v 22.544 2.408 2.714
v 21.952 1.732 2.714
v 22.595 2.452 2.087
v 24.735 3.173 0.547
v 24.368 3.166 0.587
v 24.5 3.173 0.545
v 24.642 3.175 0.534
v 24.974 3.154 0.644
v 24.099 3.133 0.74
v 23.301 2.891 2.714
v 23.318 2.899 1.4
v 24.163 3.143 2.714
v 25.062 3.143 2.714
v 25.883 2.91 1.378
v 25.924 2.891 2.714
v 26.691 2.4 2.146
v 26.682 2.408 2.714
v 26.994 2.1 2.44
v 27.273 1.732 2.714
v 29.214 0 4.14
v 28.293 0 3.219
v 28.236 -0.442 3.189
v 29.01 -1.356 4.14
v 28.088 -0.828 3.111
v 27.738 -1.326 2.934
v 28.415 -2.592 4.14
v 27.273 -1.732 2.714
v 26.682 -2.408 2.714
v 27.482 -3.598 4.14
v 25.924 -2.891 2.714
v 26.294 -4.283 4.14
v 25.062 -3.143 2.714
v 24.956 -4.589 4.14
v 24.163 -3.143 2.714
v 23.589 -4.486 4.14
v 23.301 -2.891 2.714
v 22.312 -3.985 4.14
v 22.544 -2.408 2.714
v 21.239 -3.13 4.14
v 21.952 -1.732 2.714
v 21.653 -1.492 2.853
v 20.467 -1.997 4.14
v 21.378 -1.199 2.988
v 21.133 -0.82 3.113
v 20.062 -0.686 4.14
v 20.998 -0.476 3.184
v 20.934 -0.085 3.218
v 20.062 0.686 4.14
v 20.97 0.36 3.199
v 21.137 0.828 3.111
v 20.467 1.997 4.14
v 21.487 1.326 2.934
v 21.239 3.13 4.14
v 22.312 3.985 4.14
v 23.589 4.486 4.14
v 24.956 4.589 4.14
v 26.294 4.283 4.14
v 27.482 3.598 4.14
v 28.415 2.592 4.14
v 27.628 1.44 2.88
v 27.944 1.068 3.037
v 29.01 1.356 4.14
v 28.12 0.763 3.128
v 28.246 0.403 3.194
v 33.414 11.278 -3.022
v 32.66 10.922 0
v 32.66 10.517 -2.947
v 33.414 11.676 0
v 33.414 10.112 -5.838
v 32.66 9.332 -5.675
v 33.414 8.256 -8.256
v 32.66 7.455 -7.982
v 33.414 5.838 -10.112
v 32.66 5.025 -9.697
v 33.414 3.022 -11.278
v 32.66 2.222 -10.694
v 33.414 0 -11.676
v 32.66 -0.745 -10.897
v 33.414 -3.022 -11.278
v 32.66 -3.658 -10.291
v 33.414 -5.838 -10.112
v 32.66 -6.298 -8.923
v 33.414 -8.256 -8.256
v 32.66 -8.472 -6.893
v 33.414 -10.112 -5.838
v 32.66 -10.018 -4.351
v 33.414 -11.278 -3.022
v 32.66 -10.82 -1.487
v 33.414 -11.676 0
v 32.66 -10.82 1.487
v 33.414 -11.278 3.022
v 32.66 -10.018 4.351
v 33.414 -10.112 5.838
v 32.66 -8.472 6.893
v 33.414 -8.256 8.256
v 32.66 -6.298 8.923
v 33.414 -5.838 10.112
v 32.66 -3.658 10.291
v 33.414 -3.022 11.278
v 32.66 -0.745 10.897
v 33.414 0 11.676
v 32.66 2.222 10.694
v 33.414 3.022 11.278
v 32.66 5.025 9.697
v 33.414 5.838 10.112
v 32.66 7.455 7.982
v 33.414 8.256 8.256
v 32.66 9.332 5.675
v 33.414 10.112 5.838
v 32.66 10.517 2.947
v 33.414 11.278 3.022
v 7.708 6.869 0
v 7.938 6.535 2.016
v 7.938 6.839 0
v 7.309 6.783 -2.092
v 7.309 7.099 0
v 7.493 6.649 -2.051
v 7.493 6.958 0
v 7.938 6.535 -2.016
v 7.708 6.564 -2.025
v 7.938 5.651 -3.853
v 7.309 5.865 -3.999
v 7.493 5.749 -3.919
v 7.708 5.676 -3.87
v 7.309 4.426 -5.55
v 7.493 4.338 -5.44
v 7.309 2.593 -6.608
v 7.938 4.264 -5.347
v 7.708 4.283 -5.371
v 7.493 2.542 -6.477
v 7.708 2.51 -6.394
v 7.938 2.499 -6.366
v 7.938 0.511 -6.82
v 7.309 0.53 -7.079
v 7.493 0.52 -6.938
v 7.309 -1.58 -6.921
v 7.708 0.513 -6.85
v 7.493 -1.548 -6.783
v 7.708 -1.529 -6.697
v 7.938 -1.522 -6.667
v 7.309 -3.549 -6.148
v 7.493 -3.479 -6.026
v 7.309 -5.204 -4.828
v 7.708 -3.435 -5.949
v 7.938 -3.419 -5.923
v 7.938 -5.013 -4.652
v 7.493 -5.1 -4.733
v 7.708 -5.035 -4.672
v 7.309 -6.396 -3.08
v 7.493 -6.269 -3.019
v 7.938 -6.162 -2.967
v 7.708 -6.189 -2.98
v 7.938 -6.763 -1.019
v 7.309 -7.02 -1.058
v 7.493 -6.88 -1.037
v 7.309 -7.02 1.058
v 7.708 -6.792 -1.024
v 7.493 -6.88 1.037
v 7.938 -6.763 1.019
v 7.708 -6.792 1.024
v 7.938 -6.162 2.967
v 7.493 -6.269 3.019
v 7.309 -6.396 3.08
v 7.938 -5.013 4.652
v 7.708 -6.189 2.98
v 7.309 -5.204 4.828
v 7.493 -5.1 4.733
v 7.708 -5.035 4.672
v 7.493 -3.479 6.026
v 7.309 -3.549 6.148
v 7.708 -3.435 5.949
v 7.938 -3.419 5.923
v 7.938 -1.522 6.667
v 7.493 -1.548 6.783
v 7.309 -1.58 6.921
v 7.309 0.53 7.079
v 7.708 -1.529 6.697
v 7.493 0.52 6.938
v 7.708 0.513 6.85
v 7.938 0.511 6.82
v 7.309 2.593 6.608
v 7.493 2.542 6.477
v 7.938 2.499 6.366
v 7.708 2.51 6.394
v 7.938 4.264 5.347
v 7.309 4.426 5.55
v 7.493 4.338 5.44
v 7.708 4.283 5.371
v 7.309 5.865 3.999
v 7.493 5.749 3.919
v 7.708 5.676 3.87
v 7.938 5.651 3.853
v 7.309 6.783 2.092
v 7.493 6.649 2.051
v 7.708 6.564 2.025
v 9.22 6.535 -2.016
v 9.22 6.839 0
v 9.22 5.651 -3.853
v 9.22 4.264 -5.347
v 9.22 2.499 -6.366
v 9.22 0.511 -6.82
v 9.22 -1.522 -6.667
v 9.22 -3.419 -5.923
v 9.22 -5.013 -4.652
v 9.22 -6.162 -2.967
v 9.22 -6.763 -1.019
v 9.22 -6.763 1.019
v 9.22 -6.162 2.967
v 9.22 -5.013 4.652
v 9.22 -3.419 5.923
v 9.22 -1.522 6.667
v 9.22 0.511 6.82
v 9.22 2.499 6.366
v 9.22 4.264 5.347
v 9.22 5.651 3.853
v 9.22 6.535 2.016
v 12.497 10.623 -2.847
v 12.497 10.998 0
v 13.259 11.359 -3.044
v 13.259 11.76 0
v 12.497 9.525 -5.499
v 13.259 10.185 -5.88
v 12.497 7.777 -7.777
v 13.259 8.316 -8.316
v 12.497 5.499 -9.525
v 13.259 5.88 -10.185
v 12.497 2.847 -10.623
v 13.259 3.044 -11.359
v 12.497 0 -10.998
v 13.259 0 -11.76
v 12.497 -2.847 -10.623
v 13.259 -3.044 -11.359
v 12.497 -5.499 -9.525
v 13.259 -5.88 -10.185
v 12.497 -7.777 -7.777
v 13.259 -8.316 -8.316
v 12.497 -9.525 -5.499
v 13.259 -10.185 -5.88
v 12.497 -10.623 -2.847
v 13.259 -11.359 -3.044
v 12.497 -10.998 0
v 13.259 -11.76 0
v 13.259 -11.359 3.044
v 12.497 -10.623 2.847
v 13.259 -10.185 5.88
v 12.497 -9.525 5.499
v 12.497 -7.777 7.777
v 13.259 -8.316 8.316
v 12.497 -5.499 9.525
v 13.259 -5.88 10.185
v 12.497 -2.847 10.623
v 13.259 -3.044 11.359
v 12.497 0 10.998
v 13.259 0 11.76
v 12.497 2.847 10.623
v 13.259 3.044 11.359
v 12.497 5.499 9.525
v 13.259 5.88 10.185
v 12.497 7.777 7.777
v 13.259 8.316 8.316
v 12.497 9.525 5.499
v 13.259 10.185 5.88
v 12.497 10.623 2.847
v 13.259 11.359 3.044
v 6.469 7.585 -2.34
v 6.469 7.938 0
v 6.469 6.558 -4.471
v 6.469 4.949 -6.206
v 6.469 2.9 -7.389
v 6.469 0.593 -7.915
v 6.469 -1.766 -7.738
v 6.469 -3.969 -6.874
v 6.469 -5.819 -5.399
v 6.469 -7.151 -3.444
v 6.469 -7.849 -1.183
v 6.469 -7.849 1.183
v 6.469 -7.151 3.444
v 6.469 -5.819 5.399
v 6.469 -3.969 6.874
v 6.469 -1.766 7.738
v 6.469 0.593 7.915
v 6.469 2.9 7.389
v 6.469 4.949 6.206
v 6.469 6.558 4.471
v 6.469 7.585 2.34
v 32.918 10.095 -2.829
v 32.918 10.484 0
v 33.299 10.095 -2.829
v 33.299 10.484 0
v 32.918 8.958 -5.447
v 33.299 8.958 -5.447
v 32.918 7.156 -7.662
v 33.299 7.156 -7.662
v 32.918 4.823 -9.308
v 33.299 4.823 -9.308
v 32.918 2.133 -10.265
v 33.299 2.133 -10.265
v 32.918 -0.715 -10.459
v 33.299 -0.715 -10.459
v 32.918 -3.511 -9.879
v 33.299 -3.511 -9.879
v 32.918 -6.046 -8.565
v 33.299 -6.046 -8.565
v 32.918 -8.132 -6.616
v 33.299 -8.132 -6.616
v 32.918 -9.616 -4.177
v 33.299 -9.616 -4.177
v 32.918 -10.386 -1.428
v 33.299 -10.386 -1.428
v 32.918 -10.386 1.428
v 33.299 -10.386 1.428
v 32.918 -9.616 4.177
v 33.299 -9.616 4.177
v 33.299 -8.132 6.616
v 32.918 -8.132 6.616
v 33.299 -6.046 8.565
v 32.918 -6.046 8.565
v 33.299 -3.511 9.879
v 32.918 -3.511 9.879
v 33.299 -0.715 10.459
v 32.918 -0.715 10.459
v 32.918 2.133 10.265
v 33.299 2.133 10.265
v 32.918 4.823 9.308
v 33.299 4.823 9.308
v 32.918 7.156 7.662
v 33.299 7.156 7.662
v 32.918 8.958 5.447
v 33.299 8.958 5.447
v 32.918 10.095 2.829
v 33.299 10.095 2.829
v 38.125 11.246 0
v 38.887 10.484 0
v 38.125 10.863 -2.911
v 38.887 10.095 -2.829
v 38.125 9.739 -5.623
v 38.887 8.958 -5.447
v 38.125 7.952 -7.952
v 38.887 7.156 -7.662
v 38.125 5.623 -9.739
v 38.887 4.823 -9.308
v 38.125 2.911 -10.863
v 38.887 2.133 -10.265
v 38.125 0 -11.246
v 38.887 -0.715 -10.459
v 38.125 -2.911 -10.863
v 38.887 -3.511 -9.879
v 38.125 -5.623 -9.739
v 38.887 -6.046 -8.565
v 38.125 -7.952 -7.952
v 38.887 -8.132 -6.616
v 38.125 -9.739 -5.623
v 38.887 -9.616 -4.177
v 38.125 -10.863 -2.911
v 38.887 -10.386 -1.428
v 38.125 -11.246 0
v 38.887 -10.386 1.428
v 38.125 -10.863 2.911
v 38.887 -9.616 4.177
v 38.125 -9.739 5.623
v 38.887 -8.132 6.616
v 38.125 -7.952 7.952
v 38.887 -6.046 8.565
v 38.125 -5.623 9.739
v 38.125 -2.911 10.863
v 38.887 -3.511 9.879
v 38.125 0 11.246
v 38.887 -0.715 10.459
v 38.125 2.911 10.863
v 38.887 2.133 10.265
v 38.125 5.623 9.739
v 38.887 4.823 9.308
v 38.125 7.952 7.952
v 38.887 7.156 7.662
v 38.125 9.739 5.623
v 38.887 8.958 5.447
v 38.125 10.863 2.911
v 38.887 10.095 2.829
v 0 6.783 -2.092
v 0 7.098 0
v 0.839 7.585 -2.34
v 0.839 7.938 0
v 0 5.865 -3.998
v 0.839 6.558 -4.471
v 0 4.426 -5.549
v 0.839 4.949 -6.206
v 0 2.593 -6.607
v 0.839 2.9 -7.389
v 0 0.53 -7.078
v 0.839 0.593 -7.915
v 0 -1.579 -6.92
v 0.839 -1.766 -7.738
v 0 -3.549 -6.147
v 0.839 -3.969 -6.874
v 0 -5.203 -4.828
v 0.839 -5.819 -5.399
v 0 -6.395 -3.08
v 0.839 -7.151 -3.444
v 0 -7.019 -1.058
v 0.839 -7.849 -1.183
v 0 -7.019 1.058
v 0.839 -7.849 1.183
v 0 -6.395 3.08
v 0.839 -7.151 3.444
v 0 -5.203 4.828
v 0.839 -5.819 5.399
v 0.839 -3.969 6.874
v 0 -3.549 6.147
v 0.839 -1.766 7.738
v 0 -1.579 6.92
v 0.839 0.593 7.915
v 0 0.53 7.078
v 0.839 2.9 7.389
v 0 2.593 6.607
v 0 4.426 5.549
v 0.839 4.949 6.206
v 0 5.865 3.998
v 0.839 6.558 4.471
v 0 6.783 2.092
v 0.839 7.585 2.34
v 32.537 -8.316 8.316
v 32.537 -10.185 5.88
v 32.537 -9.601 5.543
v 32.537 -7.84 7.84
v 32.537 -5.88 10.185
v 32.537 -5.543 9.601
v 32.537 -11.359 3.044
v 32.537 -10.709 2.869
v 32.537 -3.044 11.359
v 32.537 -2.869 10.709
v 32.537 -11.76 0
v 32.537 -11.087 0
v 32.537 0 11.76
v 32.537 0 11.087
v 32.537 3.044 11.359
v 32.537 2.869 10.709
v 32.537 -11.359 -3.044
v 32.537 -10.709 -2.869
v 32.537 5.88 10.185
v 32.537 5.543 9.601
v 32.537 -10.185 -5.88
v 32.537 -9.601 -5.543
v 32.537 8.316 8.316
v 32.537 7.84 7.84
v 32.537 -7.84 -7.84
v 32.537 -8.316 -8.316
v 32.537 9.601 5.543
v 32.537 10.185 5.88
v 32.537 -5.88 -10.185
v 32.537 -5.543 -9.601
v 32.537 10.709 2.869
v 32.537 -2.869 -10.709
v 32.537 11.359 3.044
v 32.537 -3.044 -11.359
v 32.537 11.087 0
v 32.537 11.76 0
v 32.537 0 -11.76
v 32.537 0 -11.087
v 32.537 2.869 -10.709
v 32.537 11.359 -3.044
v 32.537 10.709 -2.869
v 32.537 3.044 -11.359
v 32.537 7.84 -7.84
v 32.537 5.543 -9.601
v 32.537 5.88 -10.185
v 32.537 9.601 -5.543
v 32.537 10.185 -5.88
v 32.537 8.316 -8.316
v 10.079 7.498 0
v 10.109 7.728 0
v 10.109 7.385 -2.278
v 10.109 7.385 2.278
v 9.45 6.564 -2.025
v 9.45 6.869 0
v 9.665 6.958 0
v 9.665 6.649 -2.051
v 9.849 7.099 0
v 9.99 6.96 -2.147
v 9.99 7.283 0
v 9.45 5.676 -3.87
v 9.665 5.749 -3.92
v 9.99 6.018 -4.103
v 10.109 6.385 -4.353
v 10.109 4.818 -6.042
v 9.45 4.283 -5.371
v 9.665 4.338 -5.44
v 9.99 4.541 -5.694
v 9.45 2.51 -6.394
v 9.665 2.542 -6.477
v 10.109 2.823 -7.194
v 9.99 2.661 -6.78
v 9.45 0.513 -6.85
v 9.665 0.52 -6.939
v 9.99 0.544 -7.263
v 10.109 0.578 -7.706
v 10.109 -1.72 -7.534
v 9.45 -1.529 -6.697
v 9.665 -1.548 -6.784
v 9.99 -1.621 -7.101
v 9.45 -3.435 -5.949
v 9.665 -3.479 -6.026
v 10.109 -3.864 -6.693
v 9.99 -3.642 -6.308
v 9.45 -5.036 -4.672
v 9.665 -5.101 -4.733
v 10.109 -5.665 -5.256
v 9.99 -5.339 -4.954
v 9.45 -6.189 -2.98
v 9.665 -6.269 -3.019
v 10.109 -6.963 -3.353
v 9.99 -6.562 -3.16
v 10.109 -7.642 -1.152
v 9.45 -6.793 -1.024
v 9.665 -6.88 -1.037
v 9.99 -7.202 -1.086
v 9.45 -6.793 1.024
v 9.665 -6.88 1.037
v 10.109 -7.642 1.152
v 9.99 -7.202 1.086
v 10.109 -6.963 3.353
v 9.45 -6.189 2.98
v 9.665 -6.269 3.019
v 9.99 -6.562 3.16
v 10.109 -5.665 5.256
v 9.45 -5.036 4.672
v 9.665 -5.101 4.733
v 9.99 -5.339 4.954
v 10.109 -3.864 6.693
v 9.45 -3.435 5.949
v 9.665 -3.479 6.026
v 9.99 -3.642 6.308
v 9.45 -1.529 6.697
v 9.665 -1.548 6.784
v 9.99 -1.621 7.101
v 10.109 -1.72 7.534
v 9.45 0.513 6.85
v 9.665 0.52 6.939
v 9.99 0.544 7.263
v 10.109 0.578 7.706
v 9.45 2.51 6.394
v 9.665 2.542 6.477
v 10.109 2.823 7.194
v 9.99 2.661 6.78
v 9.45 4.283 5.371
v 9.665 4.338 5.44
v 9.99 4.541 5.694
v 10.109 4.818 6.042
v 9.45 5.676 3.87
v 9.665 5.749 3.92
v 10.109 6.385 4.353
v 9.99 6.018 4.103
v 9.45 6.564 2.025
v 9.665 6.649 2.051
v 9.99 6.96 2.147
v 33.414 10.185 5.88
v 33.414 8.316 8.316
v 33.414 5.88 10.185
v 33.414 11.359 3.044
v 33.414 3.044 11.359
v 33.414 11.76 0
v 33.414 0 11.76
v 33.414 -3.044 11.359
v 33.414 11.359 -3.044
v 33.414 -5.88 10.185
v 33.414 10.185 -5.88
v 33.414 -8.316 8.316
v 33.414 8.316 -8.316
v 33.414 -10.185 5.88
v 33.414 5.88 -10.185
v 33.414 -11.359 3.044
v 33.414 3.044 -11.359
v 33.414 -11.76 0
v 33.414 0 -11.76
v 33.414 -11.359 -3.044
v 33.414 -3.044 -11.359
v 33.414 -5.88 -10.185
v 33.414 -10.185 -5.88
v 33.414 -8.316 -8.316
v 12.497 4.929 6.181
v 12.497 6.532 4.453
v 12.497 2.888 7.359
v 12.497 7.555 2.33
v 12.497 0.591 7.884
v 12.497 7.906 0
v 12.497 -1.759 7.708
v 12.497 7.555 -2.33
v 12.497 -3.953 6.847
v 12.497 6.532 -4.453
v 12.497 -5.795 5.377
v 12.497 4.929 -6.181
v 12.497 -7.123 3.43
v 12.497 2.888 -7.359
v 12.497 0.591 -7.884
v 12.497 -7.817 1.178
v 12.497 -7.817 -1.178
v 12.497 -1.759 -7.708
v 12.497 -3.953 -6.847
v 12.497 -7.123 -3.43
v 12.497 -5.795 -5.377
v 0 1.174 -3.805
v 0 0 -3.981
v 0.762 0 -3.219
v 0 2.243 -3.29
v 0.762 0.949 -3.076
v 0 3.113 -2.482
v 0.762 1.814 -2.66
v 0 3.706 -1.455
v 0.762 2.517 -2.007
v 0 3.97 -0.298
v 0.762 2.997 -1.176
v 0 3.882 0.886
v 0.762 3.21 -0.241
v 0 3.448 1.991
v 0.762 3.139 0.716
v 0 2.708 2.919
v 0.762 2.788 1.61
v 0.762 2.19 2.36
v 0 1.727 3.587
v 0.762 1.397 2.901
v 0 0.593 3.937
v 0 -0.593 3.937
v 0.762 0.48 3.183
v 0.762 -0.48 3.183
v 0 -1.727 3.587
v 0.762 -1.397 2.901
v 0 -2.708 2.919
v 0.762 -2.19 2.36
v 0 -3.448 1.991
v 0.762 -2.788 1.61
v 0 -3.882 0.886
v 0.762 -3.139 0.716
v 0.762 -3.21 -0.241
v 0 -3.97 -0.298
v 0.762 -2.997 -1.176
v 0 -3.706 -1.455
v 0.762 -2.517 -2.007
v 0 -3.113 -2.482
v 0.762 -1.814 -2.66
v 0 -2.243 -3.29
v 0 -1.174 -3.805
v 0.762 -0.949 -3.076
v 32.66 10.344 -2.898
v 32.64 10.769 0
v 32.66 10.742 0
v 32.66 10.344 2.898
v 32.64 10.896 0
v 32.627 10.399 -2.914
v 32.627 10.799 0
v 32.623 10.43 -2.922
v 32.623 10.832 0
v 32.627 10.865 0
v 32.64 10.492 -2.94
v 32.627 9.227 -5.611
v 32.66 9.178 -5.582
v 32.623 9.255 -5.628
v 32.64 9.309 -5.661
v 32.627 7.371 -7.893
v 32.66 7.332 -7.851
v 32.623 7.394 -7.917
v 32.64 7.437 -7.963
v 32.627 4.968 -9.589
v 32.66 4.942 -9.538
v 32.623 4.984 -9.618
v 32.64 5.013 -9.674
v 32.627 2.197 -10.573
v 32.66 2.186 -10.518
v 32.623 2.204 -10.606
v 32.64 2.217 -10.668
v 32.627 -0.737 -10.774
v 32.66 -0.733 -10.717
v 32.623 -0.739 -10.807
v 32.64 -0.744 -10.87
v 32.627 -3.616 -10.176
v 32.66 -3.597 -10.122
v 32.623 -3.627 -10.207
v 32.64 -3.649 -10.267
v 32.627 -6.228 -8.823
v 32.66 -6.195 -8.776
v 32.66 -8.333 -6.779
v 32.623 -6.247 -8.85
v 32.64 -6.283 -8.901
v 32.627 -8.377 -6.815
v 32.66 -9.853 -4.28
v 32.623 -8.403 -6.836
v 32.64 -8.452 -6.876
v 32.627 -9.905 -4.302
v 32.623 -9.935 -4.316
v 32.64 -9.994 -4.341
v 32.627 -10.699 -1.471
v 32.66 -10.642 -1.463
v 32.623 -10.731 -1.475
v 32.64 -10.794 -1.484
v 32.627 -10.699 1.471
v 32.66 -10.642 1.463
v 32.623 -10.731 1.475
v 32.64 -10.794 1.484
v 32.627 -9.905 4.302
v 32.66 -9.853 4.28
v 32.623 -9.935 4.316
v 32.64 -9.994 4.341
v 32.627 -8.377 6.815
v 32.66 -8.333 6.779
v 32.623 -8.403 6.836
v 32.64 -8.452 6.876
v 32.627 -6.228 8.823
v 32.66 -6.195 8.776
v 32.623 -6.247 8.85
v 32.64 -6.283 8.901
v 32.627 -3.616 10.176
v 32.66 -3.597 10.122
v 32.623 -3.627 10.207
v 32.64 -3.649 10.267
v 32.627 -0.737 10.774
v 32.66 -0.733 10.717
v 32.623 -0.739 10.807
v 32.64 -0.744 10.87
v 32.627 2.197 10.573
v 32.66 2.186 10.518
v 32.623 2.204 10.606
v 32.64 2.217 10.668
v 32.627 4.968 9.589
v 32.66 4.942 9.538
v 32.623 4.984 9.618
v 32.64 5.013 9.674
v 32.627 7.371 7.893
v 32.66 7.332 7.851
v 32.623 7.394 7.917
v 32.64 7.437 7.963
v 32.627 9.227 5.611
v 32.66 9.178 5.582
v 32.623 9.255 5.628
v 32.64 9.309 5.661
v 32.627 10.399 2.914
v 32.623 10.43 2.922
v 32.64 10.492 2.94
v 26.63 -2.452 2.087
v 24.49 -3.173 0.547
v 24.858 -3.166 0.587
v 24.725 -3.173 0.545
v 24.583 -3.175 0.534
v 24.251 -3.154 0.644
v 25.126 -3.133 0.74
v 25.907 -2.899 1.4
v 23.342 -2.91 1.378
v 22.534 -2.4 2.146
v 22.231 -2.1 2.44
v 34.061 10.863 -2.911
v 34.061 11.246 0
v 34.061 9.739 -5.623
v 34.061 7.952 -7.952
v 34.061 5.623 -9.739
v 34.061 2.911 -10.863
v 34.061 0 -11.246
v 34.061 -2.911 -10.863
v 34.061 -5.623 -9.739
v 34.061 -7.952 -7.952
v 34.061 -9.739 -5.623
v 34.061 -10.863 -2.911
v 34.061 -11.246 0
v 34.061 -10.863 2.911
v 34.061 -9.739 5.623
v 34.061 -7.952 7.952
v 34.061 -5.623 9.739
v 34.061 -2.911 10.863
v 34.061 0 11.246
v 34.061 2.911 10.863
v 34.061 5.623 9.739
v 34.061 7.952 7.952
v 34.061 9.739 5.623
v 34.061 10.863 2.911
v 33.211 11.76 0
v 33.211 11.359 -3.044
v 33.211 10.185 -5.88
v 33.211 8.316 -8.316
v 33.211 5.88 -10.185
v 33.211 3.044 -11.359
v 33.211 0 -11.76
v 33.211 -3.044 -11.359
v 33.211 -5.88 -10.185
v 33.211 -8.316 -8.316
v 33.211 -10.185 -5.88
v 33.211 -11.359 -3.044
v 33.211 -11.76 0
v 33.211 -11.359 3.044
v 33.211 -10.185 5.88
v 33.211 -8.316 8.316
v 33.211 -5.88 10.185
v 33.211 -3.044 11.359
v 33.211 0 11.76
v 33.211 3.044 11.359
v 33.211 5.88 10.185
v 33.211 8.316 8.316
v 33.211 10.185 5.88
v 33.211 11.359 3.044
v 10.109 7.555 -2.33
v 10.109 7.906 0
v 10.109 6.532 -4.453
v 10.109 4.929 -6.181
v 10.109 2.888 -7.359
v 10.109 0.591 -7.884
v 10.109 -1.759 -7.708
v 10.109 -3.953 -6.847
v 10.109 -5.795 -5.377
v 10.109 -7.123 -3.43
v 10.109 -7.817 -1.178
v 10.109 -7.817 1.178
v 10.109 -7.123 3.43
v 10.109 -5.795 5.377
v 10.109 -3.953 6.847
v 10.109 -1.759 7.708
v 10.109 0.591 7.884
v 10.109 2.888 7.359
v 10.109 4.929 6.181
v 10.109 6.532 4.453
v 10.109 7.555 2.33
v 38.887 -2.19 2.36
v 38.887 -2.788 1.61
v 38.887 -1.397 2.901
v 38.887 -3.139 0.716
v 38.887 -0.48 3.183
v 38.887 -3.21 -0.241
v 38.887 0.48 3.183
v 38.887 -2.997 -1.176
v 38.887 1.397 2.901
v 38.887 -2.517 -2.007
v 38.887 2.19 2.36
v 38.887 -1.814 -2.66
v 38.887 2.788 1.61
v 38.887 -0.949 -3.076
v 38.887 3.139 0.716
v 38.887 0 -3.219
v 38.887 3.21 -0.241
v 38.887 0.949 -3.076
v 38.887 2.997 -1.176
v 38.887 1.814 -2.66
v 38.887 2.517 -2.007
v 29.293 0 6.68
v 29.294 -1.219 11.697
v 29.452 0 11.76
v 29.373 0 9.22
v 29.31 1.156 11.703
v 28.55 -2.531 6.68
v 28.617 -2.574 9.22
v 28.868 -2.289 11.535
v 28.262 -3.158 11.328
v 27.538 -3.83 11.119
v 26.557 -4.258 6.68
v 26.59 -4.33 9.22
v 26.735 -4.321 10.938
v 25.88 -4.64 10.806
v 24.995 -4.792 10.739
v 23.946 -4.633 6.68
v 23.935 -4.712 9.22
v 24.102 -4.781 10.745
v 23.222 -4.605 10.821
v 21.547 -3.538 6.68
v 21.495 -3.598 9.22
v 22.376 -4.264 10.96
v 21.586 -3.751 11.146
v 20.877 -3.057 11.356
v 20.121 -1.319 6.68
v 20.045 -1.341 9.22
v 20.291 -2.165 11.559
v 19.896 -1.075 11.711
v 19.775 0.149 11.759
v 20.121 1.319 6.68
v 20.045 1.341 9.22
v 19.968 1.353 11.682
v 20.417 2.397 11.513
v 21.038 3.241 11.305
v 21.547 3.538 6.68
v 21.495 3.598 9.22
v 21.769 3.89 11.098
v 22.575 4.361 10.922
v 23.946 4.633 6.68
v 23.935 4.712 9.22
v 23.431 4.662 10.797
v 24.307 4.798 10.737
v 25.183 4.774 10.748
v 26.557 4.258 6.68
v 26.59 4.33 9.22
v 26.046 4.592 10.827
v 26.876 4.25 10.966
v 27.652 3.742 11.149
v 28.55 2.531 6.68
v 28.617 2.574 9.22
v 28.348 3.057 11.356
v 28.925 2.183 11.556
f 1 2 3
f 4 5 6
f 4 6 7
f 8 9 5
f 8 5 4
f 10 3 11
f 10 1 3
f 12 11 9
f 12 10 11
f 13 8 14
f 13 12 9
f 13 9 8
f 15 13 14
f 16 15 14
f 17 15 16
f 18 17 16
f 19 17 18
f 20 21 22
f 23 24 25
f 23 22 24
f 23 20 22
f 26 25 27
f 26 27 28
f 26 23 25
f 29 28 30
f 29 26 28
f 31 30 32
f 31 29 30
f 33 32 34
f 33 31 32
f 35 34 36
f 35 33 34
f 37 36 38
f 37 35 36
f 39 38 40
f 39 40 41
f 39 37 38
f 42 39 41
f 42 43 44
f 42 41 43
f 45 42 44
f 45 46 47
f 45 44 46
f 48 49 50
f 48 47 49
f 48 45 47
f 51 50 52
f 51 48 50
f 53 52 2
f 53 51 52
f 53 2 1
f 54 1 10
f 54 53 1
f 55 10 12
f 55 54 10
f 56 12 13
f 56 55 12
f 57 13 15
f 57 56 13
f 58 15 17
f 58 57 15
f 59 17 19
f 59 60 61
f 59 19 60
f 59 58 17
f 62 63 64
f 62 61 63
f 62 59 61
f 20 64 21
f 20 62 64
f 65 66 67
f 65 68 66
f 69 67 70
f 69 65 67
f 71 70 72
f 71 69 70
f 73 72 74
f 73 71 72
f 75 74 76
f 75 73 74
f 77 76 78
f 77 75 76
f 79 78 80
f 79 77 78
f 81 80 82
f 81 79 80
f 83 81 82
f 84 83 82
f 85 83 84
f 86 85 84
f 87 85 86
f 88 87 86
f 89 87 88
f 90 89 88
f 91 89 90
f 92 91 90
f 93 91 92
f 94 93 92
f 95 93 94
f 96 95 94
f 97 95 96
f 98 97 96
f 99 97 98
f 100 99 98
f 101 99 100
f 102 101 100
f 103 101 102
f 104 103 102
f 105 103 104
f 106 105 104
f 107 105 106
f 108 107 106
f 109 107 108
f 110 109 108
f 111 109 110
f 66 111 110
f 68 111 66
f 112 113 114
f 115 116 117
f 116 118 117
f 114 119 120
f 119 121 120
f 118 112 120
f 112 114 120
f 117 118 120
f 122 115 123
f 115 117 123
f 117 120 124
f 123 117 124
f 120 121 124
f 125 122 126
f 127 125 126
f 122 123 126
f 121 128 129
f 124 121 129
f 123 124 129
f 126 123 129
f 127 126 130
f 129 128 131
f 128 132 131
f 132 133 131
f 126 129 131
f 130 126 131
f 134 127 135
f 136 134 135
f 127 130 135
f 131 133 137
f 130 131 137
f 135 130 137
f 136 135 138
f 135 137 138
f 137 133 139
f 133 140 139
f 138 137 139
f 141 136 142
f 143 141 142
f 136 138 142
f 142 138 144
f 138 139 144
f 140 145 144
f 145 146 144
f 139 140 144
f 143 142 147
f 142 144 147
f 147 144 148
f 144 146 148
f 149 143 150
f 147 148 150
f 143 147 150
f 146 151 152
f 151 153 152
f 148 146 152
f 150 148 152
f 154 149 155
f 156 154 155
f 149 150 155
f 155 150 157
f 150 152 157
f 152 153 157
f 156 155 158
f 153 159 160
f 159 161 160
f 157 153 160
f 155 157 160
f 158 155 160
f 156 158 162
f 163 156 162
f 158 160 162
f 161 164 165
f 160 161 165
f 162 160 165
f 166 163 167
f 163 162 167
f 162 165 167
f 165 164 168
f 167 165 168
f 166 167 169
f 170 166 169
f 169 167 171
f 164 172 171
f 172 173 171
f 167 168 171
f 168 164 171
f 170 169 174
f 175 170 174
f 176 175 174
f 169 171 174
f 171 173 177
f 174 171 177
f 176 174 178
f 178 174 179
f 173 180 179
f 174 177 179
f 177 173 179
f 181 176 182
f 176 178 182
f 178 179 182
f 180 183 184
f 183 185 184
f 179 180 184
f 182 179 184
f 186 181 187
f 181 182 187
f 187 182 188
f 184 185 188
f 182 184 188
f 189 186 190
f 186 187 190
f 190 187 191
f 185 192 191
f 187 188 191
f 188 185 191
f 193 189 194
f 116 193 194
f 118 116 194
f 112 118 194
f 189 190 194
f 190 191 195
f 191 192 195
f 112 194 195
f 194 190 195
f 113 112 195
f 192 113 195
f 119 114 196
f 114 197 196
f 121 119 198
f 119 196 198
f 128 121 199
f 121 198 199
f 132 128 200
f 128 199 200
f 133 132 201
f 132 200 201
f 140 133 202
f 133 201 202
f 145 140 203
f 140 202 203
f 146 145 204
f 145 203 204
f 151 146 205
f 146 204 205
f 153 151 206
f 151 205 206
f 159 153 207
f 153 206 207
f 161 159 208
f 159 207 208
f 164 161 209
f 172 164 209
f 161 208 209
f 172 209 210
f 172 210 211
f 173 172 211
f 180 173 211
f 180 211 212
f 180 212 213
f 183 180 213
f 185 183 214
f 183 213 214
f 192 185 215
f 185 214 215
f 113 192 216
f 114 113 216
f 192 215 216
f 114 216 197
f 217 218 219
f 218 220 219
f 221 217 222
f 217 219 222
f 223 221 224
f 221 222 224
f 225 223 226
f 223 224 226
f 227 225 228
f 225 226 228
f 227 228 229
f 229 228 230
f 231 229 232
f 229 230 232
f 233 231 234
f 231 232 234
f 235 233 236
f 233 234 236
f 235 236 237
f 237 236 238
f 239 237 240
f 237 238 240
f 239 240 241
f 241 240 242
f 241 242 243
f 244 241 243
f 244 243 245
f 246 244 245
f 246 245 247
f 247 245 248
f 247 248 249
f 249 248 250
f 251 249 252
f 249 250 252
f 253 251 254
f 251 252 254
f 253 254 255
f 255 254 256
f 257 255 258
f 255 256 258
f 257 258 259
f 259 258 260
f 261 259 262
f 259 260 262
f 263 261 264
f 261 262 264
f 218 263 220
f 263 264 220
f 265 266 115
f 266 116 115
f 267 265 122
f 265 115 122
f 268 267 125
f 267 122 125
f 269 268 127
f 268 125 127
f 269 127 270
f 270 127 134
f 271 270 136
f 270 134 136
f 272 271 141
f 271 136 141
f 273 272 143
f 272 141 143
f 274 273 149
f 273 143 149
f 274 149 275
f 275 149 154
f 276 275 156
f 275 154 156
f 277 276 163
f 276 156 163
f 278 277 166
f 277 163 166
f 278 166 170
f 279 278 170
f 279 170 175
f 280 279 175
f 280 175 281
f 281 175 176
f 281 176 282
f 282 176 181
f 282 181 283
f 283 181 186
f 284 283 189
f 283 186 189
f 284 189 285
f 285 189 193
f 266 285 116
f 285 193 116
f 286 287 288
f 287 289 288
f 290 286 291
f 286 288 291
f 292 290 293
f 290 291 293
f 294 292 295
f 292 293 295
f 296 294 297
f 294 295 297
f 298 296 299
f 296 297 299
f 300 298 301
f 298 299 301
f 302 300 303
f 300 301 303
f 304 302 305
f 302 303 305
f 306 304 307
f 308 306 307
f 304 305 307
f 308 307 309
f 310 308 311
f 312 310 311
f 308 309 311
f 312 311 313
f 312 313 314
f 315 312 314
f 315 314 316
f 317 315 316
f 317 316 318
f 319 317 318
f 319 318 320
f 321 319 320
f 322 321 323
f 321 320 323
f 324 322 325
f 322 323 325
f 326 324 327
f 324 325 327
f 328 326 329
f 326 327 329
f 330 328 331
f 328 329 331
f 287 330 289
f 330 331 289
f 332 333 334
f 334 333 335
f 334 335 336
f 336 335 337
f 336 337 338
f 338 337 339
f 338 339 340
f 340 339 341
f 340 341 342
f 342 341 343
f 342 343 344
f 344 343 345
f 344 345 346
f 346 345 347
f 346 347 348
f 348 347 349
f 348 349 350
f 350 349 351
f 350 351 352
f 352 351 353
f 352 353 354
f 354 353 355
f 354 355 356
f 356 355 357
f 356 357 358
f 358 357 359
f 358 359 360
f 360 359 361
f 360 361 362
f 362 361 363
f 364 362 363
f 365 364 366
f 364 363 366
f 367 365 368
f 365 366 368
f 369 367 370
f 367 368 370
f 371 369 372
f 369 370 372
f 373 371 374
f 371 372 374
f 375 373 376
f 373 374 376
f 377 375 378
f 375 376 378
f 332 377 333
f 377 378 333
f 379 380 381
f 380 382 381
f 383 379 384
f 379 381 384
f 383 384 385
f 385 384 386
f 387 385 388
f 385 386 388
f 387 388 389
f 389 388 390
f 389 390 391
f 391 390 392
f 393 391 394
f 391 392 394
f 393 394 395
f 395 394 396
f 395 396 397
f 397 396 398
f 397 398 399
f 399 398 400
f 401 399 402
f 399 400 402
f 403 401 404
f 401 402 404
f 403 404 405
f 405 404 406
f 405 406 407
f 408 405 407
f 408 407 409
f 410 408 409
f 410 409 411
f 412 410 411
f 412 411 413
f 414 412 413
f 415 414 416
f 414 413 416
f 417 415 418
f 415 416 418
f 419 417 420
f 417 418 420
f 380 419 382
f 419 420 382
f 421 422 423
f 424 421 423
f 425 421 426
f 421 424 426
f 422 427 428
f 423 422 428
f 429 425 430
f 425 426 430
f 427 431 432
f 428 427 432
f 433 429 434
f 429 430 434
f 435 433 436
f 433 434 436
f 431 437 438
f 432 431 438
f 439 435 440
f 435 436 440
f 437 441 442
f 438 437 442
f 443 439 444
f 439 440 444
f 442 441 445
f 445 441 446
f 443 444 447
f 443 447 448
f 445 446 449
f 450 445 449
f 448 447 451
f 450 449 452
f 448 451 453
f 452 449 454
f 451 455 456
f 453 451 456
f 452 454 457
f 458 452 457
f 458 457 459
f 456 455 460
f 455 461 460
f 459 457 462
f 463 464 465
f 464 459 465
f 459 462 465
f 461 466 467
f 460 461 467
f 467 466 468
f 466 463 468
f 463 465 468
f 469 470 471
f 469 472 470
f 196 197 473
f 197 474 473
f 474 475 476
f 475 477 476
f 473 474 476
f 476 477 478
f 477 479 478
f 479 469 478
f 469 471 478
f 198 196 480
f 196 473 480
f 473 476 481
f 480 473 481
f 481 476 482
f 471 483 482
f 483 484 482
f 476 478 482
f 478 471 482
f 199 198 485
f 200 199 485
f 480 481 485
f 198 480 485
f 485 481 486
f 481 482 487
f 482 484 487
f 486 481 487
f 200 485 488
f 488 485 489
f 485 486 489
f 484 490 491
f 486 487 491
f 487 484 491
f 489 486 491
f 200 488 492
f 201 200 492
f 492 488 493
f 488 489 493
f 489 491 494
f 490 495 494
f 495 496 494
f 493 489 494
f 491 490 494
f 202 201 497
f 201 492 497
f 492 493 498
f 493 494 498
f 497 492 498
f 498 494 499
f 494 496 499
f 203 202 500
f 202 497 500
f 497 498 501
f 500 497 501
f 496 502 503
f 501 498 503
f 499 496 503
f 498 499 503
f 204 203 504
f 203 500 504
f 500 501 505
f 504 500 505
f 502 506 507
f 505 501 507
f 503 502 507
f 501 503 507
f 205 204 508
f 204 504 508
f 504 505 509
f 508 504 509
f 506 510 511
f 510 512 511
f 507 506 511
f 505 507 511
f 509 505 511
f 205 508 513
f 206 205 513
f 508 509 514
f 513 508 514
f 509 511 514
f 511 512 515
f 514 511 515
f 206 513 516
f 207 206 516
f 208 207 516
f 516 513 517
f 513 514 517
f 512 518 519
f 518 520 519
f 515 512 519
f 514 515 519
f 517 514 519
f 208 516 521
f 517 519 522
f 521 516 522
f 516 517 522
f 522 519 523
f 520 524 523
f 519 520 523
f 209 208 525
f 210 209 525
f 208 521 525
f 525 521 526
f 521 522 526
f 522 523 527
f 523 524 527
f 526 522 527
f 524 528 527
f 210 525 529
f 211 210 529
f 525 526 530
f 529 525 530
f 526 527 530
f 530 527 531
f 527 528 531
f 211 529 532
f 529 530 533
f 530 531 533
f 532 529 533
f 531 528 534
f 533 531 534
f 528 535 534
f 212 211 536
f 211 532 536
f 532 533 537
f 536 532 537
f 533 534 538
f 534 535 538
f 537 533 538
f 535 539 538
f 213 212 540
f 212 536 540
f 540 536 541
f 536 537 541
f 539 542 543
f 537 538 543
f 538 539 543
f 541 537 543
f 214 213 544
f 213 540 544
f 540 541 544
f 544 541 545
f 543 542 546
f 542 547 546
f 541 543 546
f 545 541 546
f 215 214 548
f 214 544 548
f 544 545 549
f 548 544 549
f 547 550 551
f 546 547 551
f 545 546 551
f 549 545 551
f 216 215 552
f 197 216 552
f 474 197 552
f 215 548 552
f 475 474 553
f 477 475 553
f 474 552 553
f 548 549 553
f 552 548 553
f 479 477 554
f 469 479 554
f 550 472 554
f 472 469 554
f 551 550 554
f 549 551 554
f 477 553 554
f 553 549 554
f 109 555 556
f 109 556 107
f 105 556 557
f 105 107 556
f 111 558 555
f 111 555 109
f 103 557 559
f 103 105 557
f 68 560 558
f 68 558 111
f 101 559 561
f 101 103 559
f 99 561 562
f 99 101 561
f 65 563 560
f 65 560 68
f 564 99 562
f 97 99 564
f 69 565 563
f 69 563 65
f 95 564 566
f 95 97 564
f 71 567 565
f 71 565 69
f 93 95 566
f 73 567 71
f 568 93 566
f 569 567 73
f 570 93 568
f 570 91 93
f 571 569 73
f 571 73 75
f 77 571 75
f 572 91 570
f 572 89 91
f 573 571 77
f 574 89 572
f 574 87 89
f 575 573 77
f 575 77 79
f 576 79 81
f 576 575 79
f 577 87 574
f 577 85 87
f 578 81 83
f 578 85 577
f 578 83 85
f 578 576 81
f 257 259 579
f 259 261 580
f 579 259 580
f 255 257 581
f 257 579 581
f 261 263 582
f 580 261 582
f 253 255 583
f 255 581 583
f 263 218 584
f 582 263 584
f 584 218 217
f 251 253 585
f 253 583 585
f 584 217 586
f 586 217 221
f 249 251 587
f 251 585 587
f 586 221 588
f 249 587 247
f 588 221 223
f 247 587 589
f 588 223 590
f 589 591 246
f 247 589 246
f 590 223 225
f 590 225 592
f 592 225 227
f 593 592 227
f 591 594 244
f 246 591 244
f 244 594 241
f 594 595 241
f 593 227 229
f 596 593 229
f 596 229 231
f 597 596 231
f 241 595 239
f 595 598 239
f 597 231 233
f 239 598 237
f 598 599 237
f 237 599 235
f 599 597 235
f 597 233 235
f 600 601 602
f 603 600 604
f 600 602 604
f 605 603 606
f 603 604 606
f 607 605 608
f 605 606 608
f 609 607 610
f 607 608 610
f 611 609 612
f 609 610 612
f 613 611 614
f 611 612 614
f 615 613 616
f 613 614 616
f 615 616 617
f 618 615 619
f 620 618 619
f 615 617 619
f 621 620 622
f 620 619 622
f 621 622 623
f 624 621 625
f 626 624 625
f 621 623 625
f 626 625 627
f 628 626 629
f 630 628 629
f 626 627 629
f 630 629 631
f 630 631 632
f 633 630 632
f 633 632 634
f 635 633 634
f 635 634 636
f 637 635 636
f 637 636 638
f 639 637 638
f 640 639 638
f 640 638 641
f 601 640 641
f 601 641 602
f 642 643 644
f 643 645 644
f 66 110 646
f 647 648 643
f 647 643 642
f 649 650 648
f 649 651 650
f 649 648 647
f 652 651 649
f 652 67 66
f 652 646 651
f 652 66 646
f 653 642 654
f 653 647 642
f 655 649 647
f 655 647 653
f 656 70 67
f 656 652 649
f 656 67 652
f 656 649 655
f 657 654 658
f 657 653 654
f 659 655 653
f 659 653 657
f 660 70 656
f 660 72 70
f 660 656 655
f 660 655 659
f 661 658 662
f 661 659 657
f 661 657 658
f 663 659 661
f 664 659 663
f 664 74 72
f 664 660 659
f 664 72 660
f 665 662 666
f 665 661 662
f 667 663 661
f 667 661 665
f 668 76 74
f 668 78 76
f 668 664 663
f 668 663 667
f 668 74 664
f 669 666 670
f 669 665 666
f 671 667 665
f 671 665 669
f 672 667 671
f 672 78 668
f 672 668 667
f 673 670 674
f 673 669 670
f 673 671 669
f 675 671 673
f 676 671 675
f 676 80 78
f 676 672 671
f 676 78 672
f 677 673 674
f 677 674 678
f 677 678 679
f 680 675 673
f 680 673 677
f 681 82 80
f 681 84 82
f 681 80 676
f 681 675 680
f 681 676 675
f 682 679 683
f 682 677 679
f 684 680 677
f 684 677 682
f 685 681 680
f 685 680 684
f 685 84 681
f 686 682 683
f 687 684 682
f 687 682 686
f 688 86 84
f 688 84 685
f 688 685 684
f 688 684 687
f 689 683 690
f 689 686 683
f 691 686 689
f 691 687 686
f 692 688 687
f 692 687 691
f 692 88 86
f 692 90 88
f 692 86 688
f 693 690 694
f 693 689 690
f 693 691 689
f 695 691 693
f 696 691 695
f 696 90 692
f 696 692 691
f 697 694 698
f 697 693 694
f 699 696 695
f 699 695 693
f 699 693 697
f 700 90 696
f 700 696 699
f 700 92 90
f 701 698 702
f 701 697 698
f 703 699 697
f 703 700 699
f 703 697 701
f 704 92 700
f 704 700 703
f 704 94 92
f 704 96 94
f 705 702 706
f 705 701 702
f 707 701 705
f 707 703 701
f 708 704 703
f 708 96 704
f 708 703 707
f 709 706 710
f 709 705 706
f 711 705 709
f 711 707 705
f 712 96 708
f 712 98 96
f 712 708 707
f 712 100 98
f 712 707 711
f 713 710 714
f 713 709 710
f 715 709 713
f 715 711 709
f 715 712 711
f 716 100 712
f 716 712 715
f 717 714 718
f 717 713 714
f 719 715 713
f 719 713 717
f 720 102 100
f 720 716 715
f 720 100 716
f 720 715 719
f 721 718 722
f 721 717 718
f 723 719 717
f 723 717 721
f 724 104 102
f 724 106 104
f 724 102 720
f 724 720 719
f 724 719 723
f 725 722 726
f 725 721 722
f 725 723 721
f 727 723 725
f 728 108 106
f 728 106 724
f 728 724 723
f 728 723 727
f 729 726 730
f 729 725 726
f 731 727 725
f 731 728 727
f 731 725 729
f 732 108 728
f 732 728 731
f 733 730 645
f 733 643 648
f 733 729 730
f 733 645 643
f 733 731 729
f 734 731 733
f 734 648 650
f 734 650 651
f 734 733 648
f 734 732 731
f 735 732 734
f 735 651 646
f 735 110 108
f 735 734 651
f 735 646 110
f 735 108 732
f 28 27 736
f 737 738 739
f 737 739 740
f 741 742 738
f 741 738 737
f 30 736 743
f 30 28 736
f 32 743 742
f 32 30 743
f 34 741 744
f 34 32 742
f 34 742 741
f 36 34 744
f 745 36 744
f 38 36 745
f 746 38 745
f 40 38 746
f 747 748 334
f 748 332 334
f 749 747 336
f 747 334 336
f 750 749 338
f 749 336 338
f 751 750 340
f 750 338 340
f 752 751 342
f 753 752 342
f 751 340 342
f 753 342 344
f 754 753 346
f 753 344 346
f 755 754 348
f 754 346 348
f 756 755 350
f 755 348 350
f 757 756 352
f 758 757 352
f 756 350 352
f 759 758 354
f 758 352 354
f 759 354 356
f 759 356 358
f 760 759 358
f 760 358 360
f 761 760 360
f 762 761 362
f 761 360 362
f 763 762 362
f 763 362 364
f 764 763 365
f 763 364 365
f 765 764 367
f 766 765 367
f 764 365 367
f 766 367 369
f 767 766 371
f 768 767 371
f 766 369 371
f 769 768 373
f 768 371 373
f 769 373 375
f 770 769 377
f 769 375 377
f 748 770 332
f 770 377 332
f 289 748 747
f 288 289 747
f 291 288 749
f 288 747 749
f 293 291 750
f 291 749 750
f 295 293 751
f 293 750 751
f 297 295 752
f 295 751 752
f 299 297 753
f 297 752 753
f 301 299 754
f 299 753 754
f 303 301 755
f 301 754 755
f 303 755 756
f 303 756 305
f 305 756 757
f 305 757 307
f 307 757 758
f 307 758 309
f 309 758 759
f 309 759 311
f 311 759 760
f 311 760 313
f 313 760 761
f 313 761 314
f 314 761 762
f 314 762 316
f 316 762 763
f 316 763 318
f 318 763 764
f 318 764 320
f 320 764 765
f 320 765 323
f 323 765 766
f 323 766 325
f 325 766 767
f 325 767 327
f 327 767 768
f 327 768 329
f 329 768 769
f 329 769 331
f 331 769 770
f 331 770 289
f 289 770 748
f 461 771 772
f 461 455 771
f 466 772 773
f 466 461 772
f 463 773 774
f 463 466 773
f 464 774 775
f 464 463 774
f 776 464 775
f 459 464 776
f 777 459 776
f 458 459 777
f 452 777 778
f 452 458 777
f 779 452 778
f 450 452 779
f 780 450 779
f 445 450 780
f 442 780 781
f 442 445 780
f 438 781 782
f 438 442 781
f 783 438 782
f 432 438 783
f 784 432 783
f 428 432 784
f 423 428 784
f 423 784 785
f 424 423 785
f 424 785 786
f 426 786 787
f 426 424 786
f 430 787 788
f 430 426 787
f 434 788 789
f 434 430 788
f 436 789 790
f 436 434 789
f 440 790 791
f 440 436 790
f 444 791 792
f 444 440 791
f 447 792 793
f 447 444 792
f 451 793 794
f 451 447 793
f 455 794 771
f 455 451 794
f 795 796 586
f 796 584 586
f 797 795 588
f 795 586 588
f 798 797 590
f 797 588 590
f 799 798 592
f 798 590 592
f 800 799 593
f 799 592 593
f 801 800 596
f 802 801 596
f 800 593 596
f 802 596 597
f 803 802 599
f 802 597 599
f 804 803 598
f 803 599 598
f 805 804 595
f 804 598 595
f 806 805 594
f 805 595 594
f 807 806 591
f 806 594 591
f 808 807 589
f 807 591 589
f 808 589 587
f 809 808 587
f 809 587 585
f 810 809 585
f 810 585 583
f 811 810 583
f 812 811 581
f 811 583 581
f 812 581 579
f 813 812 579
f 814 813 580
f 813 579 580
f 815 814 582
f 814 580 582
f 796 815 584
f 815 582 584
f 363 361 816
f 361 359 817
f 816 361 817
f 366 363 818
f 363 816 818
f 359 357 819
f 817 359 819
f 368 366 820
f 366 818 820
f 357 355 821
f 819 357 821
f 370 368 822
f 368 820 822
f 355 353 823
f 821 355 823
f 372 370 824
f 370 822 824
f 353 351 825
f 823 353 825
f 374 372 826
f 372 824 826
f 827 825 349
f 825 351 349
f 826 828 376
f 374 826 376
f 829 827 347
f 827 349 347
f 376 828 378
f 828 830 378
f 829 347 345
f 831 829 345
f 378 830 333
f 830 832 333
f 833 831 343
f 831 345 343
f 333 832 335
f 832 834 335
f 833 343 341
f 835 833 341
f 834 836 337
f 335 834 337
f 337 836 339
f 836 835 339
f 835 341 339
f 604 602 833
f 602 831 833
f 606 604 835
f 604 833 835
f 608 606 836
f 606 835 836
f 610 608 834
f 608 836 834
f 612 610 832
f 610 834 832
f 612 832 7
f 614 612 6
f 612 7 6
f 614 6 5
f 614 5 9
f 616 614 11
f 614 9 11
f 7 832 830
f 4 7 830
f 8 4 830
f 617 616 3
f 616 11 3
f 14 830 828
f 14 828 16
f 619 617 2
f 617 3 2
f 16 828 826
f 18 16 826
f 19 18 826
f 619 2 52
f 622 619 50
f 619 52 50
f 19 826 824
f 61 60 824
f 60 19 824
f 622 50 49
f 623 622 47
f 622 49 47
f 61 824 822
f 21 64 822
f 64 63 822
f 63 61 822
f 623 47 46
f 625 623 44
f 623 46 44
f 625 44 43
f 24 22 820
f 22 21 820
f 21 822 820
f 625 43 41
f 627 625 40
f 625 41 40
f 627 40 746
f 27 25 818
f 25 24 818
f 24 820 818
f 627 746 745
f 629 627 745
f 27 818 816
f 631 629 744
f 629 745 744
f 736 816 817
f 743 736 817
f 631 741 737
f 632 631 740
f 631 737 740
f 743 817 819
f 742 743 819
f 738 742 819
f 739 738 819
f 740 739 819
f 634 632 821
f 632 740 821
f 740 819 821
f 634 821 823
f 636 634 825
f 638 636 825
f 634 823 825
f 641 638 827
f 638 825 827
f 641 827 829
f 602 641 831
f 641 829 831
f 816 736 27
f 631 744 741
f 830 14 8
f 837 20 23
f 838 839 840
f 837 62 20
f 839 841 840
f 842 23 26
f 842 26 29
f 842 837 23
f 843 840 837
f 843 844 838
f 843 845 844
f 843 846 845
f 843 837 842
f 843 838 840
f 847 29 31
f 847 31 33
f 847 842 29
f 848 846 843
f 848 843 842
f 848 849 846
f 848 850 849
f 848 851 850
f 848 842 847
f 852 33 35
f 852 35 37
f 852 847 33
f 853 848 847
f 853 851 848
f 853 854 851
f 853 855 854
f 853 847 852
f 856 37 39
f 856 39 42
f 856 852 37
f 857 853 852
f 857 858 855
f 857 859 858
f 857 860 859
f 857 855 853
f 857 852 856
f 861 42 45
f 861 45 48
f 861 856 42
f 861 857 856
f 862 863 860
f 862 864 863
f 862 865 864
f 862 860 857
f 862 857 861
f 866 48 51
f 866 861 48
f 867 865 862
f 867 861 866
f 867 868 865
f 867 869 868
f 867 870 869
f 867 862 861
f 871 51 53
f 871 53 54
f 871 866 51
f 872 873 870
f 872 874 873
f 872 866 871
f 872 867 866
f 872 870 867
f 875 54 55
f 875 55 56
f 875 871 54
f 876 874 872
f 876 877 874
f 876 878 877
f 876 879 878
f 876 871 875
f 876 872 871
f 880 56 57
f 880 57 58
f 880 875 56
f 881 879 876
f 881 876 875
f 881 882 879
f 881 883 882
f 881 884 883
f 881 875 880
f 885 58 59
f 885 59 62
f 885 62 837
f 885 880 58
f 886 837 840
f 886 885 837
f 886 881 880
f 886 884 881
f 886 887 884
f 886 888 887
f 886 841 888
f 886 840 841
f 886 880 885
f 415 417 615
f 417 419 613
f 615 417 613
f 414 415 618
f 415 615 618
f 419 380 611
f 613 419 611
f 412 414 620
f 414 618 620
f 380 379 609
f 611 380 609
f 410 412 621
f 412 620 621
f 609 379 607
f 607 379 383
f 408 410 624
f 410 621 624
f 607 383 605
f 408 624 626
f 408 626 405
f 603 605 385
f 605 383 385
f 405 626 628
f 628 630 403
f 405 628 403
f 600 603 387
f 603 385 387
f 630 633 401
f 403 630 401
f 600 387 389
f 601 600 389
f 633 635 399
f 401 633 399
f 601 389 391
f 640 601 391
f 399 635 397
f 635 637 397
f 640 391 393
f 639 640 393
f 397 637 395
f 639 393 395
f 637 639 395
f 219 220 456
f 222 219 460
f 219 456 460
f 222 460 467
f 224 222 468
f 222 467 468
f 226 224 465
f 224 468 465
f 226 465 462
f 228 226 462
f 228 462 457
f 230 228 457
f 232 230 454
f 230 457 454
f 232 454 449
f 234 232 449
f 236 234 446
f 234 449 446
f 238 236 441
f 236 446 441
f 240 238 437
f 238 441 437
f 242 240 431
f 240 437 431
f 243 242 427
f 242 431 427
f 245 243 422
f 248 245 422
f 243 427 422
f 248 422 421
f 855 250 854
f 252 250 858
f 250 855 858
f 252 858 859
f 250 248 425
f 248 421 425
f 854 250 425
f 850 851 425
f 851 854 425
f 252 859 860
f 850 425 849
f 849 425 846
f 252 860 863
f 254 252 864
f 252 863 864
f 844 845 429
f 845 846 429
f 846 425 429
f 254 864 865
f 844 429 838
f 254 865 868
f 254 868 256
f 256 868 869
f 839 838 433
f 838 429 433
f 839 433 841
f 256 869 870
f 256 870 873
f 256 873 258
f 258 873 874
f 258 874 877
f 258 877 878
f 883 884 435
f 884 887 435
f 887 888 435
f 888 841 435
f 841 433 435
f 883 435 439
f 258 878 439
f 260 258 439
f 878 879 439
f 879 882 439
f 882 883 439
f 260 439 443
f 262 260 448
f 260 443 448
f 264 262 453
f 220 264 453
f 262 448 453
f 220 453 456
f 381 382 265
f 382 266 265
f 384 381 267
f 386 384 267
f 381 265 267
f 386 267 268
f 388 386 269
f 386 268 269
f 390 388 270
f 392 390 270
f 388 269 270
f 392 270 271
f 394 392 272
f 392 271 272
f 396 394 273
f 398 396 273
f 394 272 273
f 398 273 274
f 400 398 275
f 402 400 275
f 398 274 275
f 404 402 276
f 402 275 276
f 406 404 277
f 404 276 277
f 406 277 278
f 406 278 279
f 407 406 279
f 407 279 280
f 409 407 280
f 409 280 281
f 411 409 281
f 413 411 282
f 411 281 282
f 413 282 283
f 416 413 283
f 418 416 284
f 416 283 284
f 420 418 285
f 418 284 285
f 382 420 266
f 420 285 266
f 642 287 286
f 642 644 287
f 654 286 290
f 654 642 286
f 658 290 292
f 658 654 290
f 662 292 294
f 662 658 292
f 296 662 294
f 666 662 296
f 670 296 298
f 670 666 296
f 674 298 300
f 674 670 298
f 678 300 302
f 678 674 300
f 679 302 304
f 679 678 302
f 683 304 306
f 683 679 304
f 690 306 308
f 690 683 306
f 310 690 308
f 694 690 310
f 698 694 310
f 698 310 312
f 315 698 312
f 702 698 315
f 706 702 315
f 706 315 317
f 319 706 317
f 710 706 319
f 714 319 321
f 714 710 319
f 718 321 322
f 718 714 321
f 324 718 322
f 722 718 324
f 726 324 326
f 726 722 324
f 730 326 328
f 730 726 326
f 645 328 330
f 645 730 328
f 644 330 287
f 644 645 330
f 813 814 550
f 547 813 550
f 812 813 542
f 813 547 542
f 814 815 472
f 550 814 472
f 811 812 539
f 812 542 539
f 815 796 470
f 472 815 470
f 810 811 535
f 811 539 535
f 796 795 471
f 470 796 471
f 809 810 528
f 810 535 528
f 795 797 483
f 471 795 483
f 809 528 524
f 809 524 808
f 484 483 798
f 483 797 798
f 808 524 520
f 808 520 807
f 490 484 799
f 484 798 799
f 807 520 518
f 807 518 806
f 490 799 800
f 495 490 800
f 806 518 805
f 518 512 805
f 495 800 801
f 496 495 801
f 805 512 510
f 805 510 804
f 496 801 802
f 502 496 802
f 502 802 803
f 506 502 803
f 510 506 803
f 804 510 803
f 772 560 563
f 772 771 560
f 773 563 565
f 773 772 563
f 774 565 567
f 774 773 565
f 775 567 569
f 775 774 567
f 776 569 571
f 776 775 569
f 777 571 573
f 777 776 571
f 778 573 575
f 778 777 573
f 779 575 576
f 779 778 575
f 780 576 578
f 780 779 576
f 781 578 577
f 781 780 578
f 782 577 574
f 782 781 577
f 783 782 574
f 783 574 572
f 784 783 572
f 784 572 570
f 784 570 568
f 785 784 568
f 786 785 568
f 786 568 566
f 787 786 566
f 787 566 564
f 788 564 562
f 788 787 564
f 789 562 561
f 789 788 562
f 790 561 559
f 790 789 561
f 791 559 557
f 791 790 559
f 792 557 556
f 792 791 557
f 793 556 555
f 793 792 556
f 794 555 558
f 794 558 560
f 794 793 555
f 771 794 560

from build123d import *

# Parameters (mm, degrees)
HOLE1_D           = 6.4389
HOLE1_CSINK_D     = 7.9629
HOLE1_CSINK_ANGLE = 90


with BuildPart() as part:
    # Sketch1 → Revolve1 (revolve)
    with BuildSketch(Plane.XY):
        with BuildLine():
            Line((0, 0), (0, 7.09803))
            Line((0, 7.09803), (0.83947, 7.9375))
            Line((0.83947, 7.9375), (6.469412072, 7.9375))
            Line((6.469412072, 7.9375), (7.30937001, 7.098844511))
            ThreePointArc((7.30937001, 7.098844511), (7.597613092, 6.906489173), (7.9375, 6.83895))
            Line((7.9375, 6.83895), (9.2202, 6.83895))
            ThreePointArc((9.2202, 6.83895), (9.848817928, 7.099332072), (10.1092, 7.72795))
            Line((10.1092, 7.72795), (10.1092, 7.90575))
            Line((10.1092, 7.90575), (12.4968, 7.90575))
            Line((12.4968, 7.90575), (12.4968, 0))
            Line((12.4968, 0), (0, 0))
        make_face()
    revolve(axis=Axis((12.4968, 0, 0), (-1, 0, 0)))

    # Sketch2 → Revolve2 (revolve)
    with BuildSketch(Plane.XY):
        Polygon((12.4968, 0), (12.4968, 10.9982), (13.2588, 11.7602), (32.5374, 11.7602), (32.5374, 10.48385), (33.2994, 10.48385), (34.0614, 11.24585), (38.1254, 11.24585), (38.8874, 10.48385), (38.8874, 0), align=None)
    revolve(axis=Axis((38.8874, 0, 0), (-1, 0, 0)))

    # Hole1 (through all)
    with Locations(Plane.ZY):
        with Locations((0, 0)):
            CounterSinkHole(HOLE1_D / 2, HOLE1_CSINK_D / 2, counter_sink_angle=HOLE1_CSINK_ANGLE)

    # Sketch5 → Cut-Revolve1 (revolve, cut)
    with BuildSketch(Plane(origin=(0, 0, 0), x_dir=(1, 0, 0), z_dir=(0, 1, 0))):
        Polygon((24.6126, 0), (27.7876, 0), (27.7876, -2.713616984), (29.214183016, -4.1402), (29.452075925, -11.7602), (24.6126, -11.7602), align=None)
    revolve(axis=Axis((24.6126, 0, 11.7602), (0, 0, -1)), mode=Mode.SUBTRACT)

    # Sketch6 → Revolve3 (revolve)
    with BuildSketch(Plane.XY):
        with BuildLine():
            Line((32.5374, 10.22985), (33.2994, 10.22985))
            Line((33.2994, 10.22985), (33.2994, 10.48385))
            Line((33.2994, 10.48385), (32.9184, 10.48385))
            Line((32.9184, 10.48385), (32.659887194, 10.742362806))
            ThreePointArc((32.659887194, 10.742362806), (32.622689755, 10.832165367), (32.659887194, 10.921967928))
            Line((32.659887194, 10.921967928), (33.41395107, 11.676031804))
            Line((33.41395107, 11.676031804), (33.41395107, 11.7602))
            Line((33.41395107, 11.7602), (33.21075107, 11.7602))
            Line((33.21075107, 11.7602), (32.5374, 11.08684893))
            Line((32.5374, 11.08684893), (32.5374, 10.22985))
        make_face()
    revolve(axis=Axis((33.2994, 0, 0), (-1, 0, 0)))


solid = part.part
